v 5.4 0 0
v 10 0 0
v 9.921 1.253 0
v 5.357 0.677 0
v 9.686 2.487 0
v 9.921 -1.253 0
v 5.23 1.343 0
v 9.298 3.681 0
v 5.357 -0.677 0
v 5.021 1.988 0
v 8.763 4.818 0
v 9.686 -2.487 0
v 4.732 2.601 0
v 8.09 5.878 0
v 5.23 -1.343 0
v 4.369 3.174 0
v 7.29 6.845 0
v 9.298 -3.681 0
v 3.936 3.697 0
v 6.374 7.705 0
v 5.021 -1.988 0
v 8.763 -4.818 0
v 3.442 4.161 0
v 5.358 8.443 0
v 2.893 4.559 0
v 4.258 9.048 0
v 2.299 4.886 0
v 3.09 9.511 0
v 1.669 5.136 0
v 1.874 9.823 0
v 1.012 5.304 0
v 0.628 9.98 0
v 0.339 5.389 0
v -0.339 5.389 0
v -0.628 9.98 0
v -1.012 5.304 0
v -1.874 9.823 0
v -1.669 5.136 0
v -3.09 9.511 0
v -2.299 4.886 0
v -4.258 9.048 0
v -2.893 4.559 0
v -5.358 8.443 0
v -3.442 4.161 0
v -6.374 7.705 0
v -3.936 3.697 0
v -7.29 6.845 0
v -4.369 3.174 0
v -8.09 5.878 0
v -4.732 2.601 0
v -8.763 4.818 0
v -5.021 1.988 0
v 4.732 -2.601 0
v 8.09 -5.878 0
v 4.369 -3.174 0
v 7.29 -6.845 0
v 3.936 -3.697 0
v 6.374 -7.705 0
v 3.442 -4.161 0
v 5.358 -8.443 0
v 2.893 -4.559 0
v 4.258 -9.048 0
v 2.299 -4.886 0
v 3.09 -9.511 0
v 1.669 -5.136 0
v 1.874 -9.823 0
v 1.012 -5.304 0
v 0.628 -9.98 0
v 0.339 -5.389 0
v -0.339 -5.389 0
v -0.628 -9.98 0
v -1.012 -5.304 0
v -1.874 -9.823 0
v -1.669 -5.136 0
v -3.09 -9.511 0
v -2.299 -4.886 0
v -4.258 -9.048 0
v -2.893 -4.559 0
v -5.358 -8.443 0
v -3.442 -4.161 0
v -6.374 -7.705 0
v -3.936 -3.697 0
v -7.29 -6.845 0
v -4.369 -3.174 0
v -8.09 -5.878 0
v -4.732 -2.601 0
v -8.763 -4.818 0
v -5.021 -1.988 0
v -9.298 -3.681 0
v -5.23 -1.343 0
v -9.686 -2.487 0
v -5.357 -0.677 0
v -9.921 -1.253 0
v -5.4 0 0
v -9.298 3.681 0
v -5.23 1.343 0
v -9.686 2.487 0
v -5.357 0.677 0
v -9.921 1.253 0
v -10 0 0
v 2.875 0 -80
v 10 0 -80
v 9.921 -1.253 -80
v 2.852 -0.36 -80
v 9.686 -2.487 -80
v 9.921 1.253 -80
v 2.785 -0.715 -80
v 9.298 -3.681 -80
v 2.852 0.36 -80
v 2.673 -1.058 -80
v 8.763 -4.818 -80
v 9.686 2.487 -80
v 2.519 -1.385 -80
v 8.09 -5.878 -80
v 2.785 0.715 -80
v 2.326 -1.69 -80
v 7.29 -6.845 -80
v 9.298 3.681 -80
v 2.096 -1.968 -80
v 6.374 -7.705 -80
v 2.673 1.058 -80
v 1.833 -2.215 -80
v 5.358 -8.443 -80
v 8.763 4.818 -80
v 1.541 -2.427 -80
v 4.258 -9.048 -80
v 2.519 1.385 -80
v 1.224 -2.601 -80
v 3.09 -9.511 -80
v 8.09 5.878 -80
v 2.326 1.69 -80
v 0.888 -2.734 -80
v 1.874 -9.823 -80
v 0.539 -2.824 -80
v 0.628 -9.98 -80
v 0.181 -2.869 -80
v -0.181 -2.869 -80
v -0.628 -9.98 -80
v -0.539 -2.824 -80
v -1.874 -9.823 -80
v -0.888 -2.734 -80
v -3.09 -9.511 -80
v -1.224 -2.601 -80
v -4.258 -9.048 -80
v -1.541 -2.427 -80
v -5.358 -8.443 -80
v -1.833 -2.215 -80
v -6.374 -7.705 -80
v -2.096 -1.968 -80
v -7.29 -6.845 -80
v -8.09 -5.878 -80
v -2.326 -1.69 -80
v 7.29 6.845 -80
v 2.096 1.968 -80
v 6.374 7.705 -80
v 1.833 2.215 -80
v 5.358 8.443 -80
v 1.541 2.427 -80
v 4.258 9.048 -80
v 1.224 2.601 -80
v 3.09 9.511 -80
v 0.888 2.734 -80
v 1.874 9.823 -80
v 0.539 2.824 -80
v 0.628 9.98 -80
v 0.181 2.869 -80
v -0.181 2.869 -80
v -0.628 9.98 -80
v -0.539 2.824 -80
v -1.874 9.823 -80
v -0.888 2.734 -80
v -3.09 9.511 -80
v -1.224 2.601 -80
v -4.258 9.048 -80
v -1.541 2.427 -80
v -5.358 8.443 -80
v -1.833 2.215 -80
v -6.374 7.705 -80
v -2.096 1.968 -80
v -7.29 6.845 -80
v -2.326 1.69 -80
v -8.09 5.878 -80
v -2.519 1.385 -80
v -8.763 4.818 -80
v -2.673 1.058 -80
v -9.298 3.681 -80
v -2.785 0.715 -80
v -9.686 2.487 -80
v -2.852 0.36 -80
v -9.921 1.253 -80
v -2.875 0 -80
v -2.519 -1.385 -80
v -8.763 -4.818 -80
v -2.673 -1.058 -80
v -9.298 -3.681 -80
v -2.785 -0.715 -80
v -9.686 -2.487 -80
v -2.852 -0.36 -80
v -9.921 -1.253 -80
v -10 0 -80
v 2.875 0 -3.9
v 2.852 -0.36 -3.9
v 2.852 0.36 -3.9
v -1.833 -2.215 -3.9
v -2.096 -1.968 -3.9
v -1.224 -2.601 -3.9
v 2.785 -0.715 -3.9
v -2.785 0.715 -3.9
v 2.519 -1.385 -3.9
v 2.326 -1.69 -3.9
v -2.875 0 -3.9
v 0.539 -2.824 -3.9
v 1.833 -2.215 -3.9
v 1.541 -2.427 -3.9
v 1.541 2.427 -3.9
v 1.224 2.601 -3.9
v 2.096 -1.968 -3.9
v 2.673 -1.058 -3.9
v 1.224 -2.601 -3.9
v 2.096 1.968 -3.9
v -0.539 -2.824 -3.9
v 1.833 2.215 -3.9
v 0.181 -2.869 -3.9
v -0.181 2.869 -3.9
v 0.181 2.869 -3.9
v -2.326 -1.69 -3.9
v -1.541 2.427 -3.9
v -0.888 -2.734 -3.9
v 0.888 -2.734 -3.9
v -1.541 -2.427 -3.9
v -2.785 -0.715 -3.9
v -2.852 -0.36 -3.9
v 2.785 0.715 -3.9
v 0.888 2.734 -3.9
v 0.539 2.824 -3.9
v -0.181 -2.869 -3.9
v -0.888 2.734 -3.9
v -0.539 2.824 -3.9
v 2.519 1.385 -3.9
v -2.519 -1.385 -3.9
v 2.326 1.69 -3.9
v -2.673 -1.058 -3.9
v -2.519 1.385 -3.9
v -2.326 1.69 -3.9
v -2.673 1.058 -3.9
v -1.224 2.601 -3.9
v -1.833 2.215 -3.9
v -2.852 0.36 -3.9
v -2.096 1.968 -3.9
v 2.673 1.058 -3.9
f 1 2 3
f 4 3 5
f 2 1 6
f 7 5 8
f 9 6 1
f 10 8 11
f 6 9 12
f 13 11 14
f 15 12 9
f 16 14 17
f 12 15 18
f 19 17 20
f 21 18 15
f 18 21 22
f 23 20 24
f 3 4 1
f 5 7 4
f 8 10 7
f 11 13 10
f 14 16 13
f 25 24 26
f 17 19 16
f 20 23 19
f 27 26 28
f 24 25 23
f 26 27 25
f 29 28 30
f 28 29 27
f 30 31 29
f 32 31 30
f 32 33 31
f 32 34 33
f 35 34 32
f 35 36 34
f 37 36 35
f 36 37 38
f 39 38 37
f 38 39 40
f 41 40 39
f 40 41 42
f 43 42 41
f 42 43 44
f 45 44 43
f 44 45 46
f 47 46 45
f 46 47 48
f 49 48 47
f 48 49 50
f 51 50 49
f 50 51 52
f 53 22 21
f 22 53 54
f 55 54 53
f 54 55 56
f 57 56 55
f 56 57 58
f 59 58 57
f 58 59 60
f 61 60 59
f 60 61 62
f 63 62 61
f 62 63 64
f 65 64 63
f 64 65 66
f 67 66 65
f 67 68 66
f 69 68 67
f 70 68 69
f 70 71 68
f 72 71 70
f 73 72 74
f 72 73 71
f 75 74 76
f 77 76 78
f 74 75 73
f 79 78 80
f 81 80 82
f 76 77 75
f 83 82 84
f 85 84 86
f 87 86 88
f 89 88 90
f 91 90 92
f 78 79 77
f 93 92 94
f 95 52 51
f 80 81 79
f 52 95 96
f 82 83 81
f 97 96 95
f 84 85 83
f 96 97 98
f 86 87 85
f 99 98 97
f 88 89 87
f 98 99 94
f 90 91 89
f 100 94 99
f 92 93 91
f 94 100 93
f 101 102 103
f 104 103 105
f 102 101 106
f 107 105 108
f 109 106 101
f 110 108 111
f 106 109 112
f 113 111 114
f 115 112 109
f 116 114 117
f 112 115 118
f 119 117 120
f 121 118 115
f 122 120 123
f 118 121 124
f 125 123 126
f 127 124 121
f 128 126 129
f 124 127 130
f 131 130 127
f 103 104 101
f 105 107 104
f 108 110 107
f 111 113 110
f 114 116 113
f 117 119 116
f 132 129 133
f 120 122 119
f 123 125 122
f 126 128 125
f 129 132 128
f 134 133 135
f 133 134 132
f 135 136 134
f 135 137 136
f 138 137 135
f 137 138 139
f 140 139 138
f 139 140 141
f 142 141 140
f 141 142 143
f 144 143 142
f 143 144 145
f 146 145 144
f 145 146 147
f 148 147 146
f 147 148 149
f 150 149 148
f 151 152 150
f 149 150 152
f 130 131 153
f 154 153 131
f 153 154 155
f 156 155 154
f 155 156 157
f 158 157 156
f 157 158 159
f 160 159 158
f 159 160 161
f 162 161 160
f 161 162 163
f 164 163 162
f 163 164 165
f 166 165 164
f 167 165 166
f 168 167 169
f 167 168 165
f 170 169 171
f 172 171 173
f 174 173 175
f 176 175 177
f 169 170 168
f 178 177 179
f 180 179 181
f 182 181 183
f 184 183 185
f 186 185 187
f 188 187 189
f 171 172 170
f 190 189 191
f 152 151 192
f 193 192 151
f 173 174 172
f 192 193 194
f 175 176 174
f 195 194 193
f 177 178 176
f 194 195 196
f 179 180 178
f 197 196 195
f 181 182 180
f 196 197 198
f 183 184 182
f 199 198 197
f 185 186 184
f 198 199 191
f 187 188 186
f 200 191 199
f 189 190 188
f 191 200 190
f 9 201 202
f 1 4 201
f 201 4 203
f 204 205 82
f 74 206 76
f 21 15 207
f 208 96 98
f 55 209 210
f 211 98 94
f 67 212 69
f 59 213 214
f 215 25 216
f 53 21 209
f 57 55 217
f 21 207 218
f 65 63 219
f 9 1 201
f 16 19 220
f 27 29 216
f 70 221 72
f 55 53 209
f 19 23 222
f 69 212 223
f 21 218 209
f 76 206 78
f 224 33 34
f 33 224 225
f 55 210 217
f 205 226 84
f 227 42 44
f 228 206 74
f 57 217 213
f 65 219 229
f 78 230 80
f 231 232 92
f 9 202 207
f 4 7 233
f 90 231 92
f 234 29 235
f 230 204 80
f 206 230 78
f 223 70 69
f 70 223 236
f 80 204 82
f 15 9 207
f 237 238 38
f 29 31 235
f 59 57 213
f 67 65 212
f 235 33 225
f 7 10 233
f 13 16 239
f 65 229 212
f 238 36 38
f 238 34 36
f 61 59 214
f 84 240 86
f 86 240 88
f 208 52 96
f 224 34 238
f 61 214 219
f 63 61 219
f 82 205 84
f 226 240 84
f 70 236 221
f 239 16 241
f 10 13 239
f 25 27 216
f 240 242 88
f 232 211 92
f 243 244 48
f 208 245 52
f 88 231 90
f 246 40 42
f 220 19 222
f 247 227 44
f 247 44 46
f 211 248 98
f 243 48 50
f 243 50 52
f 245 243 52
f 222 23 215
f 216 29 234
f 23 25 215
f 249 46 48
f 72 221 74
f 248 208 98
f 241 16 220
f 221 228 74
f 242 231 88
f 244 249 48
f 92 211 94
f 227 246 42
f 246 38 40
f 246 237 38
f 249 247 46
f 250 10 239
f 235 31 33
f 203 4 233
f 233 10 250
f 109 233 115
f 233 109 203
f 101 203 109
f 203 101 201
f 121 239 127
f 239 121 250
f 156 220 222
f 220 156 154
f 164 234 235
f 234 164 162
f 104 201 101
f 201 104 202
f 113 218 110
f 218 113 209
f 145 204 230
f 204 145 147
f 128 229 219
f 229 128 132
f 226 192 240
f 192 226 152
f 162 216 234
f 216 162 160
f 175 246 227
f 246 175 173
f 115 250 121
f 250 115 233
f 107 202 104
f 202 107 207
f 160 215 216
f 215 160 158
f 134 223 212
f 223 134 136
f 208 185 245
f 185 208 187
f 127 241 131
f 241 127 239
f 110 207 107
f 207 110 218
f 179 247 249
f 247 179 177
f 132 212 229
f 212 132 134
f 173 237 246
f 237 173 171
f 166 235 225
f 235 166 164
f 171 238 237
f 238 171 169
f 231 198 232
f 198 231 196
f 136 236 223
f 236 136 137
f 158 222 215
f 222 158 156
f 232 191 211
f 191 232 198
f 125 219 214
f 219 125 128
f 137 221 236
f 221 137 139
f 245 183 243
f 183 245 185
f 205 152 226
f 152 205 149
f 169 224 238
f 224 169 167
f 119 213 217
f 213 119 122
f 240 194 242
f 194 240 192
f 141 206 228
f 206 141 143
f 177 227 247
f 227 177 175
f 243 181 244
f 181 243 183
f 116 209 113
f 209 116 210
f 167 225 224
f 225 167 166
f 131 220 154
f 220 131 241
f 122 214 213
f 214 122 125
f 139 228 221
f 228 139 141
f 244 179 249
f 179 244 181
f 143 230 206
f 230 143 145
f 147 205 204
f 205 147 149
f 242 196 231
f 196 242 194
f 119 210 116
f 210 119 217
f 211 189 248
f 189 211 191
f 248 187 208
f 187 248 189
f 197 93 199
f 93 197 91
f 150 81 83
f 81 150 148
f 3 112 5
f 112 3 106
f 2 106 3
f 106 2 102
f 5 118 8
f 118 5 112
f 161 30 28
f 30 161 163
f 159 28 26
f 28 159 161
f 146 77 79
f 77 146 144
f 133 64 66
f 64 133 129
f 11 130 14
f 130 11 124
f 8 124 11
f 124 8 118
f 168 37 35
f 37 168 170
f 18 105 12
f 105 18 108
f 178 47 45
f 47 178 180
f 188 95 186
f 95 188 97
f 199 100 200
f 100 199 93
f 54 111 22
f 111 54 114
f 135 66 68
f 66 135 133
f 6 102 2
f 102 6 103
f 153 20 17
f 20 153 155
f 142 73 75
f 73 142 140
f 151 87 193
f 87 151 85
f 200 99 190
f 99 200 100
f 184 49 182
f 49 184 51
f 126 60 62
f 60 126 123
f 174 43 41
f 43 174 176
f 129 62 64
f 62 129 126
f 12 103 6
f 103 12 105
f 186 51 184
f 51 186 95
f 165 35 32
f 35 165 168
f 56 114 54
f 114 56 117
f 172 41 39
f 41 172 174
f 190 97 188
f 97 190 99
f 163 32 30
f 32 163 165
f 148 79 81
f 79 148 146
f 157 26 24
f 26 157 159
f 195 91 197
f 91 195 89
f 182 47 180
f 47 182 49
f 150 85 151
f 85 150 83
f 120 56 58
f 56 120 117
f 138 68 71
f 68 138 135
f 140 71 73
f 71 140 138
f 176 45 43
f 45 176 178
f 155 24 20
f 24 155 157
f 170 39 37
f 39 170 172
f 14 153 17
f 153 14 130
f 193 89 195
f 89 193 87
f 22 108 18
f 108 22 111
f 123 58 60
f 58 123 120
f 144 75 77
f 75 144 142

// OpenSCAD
$fn = 50;


difference() {
	union() {
		translate(v = [0, 0, -80.0000000000]) {
			cylinder(h = 80, r = 10.0000000000);
		}
		cylinder(h = 0, r = 13.0000000000);
	}
	union() {
		translate(v = [0, 0, 0]) {
			rotate(a = [0, 0, 0]) {
				difference() {
					union() {
						#translate(v = [0, 0, -80.0000000000]) {
							cylinder(h = 80, r = 2.6000000000);
						}
						#translate(v = [0, 0, -3.9000000000]) {
							cylinder(h = 3.9000000000, r = 10.0000000000, r1 = 2.8750000000, r2 = 5.4000000000);
						}
						#translate(v = [0, 0, -80.0000000000]) {
							cylinder(h = 80, r = 2.8750000000);
						}
						#translate(v = [0, 0, -80.0000000000]) {
							cylinder(h = 80, r = 2.6000000000);
						}
					}
					union();
				}
			}
		}
	}
}
